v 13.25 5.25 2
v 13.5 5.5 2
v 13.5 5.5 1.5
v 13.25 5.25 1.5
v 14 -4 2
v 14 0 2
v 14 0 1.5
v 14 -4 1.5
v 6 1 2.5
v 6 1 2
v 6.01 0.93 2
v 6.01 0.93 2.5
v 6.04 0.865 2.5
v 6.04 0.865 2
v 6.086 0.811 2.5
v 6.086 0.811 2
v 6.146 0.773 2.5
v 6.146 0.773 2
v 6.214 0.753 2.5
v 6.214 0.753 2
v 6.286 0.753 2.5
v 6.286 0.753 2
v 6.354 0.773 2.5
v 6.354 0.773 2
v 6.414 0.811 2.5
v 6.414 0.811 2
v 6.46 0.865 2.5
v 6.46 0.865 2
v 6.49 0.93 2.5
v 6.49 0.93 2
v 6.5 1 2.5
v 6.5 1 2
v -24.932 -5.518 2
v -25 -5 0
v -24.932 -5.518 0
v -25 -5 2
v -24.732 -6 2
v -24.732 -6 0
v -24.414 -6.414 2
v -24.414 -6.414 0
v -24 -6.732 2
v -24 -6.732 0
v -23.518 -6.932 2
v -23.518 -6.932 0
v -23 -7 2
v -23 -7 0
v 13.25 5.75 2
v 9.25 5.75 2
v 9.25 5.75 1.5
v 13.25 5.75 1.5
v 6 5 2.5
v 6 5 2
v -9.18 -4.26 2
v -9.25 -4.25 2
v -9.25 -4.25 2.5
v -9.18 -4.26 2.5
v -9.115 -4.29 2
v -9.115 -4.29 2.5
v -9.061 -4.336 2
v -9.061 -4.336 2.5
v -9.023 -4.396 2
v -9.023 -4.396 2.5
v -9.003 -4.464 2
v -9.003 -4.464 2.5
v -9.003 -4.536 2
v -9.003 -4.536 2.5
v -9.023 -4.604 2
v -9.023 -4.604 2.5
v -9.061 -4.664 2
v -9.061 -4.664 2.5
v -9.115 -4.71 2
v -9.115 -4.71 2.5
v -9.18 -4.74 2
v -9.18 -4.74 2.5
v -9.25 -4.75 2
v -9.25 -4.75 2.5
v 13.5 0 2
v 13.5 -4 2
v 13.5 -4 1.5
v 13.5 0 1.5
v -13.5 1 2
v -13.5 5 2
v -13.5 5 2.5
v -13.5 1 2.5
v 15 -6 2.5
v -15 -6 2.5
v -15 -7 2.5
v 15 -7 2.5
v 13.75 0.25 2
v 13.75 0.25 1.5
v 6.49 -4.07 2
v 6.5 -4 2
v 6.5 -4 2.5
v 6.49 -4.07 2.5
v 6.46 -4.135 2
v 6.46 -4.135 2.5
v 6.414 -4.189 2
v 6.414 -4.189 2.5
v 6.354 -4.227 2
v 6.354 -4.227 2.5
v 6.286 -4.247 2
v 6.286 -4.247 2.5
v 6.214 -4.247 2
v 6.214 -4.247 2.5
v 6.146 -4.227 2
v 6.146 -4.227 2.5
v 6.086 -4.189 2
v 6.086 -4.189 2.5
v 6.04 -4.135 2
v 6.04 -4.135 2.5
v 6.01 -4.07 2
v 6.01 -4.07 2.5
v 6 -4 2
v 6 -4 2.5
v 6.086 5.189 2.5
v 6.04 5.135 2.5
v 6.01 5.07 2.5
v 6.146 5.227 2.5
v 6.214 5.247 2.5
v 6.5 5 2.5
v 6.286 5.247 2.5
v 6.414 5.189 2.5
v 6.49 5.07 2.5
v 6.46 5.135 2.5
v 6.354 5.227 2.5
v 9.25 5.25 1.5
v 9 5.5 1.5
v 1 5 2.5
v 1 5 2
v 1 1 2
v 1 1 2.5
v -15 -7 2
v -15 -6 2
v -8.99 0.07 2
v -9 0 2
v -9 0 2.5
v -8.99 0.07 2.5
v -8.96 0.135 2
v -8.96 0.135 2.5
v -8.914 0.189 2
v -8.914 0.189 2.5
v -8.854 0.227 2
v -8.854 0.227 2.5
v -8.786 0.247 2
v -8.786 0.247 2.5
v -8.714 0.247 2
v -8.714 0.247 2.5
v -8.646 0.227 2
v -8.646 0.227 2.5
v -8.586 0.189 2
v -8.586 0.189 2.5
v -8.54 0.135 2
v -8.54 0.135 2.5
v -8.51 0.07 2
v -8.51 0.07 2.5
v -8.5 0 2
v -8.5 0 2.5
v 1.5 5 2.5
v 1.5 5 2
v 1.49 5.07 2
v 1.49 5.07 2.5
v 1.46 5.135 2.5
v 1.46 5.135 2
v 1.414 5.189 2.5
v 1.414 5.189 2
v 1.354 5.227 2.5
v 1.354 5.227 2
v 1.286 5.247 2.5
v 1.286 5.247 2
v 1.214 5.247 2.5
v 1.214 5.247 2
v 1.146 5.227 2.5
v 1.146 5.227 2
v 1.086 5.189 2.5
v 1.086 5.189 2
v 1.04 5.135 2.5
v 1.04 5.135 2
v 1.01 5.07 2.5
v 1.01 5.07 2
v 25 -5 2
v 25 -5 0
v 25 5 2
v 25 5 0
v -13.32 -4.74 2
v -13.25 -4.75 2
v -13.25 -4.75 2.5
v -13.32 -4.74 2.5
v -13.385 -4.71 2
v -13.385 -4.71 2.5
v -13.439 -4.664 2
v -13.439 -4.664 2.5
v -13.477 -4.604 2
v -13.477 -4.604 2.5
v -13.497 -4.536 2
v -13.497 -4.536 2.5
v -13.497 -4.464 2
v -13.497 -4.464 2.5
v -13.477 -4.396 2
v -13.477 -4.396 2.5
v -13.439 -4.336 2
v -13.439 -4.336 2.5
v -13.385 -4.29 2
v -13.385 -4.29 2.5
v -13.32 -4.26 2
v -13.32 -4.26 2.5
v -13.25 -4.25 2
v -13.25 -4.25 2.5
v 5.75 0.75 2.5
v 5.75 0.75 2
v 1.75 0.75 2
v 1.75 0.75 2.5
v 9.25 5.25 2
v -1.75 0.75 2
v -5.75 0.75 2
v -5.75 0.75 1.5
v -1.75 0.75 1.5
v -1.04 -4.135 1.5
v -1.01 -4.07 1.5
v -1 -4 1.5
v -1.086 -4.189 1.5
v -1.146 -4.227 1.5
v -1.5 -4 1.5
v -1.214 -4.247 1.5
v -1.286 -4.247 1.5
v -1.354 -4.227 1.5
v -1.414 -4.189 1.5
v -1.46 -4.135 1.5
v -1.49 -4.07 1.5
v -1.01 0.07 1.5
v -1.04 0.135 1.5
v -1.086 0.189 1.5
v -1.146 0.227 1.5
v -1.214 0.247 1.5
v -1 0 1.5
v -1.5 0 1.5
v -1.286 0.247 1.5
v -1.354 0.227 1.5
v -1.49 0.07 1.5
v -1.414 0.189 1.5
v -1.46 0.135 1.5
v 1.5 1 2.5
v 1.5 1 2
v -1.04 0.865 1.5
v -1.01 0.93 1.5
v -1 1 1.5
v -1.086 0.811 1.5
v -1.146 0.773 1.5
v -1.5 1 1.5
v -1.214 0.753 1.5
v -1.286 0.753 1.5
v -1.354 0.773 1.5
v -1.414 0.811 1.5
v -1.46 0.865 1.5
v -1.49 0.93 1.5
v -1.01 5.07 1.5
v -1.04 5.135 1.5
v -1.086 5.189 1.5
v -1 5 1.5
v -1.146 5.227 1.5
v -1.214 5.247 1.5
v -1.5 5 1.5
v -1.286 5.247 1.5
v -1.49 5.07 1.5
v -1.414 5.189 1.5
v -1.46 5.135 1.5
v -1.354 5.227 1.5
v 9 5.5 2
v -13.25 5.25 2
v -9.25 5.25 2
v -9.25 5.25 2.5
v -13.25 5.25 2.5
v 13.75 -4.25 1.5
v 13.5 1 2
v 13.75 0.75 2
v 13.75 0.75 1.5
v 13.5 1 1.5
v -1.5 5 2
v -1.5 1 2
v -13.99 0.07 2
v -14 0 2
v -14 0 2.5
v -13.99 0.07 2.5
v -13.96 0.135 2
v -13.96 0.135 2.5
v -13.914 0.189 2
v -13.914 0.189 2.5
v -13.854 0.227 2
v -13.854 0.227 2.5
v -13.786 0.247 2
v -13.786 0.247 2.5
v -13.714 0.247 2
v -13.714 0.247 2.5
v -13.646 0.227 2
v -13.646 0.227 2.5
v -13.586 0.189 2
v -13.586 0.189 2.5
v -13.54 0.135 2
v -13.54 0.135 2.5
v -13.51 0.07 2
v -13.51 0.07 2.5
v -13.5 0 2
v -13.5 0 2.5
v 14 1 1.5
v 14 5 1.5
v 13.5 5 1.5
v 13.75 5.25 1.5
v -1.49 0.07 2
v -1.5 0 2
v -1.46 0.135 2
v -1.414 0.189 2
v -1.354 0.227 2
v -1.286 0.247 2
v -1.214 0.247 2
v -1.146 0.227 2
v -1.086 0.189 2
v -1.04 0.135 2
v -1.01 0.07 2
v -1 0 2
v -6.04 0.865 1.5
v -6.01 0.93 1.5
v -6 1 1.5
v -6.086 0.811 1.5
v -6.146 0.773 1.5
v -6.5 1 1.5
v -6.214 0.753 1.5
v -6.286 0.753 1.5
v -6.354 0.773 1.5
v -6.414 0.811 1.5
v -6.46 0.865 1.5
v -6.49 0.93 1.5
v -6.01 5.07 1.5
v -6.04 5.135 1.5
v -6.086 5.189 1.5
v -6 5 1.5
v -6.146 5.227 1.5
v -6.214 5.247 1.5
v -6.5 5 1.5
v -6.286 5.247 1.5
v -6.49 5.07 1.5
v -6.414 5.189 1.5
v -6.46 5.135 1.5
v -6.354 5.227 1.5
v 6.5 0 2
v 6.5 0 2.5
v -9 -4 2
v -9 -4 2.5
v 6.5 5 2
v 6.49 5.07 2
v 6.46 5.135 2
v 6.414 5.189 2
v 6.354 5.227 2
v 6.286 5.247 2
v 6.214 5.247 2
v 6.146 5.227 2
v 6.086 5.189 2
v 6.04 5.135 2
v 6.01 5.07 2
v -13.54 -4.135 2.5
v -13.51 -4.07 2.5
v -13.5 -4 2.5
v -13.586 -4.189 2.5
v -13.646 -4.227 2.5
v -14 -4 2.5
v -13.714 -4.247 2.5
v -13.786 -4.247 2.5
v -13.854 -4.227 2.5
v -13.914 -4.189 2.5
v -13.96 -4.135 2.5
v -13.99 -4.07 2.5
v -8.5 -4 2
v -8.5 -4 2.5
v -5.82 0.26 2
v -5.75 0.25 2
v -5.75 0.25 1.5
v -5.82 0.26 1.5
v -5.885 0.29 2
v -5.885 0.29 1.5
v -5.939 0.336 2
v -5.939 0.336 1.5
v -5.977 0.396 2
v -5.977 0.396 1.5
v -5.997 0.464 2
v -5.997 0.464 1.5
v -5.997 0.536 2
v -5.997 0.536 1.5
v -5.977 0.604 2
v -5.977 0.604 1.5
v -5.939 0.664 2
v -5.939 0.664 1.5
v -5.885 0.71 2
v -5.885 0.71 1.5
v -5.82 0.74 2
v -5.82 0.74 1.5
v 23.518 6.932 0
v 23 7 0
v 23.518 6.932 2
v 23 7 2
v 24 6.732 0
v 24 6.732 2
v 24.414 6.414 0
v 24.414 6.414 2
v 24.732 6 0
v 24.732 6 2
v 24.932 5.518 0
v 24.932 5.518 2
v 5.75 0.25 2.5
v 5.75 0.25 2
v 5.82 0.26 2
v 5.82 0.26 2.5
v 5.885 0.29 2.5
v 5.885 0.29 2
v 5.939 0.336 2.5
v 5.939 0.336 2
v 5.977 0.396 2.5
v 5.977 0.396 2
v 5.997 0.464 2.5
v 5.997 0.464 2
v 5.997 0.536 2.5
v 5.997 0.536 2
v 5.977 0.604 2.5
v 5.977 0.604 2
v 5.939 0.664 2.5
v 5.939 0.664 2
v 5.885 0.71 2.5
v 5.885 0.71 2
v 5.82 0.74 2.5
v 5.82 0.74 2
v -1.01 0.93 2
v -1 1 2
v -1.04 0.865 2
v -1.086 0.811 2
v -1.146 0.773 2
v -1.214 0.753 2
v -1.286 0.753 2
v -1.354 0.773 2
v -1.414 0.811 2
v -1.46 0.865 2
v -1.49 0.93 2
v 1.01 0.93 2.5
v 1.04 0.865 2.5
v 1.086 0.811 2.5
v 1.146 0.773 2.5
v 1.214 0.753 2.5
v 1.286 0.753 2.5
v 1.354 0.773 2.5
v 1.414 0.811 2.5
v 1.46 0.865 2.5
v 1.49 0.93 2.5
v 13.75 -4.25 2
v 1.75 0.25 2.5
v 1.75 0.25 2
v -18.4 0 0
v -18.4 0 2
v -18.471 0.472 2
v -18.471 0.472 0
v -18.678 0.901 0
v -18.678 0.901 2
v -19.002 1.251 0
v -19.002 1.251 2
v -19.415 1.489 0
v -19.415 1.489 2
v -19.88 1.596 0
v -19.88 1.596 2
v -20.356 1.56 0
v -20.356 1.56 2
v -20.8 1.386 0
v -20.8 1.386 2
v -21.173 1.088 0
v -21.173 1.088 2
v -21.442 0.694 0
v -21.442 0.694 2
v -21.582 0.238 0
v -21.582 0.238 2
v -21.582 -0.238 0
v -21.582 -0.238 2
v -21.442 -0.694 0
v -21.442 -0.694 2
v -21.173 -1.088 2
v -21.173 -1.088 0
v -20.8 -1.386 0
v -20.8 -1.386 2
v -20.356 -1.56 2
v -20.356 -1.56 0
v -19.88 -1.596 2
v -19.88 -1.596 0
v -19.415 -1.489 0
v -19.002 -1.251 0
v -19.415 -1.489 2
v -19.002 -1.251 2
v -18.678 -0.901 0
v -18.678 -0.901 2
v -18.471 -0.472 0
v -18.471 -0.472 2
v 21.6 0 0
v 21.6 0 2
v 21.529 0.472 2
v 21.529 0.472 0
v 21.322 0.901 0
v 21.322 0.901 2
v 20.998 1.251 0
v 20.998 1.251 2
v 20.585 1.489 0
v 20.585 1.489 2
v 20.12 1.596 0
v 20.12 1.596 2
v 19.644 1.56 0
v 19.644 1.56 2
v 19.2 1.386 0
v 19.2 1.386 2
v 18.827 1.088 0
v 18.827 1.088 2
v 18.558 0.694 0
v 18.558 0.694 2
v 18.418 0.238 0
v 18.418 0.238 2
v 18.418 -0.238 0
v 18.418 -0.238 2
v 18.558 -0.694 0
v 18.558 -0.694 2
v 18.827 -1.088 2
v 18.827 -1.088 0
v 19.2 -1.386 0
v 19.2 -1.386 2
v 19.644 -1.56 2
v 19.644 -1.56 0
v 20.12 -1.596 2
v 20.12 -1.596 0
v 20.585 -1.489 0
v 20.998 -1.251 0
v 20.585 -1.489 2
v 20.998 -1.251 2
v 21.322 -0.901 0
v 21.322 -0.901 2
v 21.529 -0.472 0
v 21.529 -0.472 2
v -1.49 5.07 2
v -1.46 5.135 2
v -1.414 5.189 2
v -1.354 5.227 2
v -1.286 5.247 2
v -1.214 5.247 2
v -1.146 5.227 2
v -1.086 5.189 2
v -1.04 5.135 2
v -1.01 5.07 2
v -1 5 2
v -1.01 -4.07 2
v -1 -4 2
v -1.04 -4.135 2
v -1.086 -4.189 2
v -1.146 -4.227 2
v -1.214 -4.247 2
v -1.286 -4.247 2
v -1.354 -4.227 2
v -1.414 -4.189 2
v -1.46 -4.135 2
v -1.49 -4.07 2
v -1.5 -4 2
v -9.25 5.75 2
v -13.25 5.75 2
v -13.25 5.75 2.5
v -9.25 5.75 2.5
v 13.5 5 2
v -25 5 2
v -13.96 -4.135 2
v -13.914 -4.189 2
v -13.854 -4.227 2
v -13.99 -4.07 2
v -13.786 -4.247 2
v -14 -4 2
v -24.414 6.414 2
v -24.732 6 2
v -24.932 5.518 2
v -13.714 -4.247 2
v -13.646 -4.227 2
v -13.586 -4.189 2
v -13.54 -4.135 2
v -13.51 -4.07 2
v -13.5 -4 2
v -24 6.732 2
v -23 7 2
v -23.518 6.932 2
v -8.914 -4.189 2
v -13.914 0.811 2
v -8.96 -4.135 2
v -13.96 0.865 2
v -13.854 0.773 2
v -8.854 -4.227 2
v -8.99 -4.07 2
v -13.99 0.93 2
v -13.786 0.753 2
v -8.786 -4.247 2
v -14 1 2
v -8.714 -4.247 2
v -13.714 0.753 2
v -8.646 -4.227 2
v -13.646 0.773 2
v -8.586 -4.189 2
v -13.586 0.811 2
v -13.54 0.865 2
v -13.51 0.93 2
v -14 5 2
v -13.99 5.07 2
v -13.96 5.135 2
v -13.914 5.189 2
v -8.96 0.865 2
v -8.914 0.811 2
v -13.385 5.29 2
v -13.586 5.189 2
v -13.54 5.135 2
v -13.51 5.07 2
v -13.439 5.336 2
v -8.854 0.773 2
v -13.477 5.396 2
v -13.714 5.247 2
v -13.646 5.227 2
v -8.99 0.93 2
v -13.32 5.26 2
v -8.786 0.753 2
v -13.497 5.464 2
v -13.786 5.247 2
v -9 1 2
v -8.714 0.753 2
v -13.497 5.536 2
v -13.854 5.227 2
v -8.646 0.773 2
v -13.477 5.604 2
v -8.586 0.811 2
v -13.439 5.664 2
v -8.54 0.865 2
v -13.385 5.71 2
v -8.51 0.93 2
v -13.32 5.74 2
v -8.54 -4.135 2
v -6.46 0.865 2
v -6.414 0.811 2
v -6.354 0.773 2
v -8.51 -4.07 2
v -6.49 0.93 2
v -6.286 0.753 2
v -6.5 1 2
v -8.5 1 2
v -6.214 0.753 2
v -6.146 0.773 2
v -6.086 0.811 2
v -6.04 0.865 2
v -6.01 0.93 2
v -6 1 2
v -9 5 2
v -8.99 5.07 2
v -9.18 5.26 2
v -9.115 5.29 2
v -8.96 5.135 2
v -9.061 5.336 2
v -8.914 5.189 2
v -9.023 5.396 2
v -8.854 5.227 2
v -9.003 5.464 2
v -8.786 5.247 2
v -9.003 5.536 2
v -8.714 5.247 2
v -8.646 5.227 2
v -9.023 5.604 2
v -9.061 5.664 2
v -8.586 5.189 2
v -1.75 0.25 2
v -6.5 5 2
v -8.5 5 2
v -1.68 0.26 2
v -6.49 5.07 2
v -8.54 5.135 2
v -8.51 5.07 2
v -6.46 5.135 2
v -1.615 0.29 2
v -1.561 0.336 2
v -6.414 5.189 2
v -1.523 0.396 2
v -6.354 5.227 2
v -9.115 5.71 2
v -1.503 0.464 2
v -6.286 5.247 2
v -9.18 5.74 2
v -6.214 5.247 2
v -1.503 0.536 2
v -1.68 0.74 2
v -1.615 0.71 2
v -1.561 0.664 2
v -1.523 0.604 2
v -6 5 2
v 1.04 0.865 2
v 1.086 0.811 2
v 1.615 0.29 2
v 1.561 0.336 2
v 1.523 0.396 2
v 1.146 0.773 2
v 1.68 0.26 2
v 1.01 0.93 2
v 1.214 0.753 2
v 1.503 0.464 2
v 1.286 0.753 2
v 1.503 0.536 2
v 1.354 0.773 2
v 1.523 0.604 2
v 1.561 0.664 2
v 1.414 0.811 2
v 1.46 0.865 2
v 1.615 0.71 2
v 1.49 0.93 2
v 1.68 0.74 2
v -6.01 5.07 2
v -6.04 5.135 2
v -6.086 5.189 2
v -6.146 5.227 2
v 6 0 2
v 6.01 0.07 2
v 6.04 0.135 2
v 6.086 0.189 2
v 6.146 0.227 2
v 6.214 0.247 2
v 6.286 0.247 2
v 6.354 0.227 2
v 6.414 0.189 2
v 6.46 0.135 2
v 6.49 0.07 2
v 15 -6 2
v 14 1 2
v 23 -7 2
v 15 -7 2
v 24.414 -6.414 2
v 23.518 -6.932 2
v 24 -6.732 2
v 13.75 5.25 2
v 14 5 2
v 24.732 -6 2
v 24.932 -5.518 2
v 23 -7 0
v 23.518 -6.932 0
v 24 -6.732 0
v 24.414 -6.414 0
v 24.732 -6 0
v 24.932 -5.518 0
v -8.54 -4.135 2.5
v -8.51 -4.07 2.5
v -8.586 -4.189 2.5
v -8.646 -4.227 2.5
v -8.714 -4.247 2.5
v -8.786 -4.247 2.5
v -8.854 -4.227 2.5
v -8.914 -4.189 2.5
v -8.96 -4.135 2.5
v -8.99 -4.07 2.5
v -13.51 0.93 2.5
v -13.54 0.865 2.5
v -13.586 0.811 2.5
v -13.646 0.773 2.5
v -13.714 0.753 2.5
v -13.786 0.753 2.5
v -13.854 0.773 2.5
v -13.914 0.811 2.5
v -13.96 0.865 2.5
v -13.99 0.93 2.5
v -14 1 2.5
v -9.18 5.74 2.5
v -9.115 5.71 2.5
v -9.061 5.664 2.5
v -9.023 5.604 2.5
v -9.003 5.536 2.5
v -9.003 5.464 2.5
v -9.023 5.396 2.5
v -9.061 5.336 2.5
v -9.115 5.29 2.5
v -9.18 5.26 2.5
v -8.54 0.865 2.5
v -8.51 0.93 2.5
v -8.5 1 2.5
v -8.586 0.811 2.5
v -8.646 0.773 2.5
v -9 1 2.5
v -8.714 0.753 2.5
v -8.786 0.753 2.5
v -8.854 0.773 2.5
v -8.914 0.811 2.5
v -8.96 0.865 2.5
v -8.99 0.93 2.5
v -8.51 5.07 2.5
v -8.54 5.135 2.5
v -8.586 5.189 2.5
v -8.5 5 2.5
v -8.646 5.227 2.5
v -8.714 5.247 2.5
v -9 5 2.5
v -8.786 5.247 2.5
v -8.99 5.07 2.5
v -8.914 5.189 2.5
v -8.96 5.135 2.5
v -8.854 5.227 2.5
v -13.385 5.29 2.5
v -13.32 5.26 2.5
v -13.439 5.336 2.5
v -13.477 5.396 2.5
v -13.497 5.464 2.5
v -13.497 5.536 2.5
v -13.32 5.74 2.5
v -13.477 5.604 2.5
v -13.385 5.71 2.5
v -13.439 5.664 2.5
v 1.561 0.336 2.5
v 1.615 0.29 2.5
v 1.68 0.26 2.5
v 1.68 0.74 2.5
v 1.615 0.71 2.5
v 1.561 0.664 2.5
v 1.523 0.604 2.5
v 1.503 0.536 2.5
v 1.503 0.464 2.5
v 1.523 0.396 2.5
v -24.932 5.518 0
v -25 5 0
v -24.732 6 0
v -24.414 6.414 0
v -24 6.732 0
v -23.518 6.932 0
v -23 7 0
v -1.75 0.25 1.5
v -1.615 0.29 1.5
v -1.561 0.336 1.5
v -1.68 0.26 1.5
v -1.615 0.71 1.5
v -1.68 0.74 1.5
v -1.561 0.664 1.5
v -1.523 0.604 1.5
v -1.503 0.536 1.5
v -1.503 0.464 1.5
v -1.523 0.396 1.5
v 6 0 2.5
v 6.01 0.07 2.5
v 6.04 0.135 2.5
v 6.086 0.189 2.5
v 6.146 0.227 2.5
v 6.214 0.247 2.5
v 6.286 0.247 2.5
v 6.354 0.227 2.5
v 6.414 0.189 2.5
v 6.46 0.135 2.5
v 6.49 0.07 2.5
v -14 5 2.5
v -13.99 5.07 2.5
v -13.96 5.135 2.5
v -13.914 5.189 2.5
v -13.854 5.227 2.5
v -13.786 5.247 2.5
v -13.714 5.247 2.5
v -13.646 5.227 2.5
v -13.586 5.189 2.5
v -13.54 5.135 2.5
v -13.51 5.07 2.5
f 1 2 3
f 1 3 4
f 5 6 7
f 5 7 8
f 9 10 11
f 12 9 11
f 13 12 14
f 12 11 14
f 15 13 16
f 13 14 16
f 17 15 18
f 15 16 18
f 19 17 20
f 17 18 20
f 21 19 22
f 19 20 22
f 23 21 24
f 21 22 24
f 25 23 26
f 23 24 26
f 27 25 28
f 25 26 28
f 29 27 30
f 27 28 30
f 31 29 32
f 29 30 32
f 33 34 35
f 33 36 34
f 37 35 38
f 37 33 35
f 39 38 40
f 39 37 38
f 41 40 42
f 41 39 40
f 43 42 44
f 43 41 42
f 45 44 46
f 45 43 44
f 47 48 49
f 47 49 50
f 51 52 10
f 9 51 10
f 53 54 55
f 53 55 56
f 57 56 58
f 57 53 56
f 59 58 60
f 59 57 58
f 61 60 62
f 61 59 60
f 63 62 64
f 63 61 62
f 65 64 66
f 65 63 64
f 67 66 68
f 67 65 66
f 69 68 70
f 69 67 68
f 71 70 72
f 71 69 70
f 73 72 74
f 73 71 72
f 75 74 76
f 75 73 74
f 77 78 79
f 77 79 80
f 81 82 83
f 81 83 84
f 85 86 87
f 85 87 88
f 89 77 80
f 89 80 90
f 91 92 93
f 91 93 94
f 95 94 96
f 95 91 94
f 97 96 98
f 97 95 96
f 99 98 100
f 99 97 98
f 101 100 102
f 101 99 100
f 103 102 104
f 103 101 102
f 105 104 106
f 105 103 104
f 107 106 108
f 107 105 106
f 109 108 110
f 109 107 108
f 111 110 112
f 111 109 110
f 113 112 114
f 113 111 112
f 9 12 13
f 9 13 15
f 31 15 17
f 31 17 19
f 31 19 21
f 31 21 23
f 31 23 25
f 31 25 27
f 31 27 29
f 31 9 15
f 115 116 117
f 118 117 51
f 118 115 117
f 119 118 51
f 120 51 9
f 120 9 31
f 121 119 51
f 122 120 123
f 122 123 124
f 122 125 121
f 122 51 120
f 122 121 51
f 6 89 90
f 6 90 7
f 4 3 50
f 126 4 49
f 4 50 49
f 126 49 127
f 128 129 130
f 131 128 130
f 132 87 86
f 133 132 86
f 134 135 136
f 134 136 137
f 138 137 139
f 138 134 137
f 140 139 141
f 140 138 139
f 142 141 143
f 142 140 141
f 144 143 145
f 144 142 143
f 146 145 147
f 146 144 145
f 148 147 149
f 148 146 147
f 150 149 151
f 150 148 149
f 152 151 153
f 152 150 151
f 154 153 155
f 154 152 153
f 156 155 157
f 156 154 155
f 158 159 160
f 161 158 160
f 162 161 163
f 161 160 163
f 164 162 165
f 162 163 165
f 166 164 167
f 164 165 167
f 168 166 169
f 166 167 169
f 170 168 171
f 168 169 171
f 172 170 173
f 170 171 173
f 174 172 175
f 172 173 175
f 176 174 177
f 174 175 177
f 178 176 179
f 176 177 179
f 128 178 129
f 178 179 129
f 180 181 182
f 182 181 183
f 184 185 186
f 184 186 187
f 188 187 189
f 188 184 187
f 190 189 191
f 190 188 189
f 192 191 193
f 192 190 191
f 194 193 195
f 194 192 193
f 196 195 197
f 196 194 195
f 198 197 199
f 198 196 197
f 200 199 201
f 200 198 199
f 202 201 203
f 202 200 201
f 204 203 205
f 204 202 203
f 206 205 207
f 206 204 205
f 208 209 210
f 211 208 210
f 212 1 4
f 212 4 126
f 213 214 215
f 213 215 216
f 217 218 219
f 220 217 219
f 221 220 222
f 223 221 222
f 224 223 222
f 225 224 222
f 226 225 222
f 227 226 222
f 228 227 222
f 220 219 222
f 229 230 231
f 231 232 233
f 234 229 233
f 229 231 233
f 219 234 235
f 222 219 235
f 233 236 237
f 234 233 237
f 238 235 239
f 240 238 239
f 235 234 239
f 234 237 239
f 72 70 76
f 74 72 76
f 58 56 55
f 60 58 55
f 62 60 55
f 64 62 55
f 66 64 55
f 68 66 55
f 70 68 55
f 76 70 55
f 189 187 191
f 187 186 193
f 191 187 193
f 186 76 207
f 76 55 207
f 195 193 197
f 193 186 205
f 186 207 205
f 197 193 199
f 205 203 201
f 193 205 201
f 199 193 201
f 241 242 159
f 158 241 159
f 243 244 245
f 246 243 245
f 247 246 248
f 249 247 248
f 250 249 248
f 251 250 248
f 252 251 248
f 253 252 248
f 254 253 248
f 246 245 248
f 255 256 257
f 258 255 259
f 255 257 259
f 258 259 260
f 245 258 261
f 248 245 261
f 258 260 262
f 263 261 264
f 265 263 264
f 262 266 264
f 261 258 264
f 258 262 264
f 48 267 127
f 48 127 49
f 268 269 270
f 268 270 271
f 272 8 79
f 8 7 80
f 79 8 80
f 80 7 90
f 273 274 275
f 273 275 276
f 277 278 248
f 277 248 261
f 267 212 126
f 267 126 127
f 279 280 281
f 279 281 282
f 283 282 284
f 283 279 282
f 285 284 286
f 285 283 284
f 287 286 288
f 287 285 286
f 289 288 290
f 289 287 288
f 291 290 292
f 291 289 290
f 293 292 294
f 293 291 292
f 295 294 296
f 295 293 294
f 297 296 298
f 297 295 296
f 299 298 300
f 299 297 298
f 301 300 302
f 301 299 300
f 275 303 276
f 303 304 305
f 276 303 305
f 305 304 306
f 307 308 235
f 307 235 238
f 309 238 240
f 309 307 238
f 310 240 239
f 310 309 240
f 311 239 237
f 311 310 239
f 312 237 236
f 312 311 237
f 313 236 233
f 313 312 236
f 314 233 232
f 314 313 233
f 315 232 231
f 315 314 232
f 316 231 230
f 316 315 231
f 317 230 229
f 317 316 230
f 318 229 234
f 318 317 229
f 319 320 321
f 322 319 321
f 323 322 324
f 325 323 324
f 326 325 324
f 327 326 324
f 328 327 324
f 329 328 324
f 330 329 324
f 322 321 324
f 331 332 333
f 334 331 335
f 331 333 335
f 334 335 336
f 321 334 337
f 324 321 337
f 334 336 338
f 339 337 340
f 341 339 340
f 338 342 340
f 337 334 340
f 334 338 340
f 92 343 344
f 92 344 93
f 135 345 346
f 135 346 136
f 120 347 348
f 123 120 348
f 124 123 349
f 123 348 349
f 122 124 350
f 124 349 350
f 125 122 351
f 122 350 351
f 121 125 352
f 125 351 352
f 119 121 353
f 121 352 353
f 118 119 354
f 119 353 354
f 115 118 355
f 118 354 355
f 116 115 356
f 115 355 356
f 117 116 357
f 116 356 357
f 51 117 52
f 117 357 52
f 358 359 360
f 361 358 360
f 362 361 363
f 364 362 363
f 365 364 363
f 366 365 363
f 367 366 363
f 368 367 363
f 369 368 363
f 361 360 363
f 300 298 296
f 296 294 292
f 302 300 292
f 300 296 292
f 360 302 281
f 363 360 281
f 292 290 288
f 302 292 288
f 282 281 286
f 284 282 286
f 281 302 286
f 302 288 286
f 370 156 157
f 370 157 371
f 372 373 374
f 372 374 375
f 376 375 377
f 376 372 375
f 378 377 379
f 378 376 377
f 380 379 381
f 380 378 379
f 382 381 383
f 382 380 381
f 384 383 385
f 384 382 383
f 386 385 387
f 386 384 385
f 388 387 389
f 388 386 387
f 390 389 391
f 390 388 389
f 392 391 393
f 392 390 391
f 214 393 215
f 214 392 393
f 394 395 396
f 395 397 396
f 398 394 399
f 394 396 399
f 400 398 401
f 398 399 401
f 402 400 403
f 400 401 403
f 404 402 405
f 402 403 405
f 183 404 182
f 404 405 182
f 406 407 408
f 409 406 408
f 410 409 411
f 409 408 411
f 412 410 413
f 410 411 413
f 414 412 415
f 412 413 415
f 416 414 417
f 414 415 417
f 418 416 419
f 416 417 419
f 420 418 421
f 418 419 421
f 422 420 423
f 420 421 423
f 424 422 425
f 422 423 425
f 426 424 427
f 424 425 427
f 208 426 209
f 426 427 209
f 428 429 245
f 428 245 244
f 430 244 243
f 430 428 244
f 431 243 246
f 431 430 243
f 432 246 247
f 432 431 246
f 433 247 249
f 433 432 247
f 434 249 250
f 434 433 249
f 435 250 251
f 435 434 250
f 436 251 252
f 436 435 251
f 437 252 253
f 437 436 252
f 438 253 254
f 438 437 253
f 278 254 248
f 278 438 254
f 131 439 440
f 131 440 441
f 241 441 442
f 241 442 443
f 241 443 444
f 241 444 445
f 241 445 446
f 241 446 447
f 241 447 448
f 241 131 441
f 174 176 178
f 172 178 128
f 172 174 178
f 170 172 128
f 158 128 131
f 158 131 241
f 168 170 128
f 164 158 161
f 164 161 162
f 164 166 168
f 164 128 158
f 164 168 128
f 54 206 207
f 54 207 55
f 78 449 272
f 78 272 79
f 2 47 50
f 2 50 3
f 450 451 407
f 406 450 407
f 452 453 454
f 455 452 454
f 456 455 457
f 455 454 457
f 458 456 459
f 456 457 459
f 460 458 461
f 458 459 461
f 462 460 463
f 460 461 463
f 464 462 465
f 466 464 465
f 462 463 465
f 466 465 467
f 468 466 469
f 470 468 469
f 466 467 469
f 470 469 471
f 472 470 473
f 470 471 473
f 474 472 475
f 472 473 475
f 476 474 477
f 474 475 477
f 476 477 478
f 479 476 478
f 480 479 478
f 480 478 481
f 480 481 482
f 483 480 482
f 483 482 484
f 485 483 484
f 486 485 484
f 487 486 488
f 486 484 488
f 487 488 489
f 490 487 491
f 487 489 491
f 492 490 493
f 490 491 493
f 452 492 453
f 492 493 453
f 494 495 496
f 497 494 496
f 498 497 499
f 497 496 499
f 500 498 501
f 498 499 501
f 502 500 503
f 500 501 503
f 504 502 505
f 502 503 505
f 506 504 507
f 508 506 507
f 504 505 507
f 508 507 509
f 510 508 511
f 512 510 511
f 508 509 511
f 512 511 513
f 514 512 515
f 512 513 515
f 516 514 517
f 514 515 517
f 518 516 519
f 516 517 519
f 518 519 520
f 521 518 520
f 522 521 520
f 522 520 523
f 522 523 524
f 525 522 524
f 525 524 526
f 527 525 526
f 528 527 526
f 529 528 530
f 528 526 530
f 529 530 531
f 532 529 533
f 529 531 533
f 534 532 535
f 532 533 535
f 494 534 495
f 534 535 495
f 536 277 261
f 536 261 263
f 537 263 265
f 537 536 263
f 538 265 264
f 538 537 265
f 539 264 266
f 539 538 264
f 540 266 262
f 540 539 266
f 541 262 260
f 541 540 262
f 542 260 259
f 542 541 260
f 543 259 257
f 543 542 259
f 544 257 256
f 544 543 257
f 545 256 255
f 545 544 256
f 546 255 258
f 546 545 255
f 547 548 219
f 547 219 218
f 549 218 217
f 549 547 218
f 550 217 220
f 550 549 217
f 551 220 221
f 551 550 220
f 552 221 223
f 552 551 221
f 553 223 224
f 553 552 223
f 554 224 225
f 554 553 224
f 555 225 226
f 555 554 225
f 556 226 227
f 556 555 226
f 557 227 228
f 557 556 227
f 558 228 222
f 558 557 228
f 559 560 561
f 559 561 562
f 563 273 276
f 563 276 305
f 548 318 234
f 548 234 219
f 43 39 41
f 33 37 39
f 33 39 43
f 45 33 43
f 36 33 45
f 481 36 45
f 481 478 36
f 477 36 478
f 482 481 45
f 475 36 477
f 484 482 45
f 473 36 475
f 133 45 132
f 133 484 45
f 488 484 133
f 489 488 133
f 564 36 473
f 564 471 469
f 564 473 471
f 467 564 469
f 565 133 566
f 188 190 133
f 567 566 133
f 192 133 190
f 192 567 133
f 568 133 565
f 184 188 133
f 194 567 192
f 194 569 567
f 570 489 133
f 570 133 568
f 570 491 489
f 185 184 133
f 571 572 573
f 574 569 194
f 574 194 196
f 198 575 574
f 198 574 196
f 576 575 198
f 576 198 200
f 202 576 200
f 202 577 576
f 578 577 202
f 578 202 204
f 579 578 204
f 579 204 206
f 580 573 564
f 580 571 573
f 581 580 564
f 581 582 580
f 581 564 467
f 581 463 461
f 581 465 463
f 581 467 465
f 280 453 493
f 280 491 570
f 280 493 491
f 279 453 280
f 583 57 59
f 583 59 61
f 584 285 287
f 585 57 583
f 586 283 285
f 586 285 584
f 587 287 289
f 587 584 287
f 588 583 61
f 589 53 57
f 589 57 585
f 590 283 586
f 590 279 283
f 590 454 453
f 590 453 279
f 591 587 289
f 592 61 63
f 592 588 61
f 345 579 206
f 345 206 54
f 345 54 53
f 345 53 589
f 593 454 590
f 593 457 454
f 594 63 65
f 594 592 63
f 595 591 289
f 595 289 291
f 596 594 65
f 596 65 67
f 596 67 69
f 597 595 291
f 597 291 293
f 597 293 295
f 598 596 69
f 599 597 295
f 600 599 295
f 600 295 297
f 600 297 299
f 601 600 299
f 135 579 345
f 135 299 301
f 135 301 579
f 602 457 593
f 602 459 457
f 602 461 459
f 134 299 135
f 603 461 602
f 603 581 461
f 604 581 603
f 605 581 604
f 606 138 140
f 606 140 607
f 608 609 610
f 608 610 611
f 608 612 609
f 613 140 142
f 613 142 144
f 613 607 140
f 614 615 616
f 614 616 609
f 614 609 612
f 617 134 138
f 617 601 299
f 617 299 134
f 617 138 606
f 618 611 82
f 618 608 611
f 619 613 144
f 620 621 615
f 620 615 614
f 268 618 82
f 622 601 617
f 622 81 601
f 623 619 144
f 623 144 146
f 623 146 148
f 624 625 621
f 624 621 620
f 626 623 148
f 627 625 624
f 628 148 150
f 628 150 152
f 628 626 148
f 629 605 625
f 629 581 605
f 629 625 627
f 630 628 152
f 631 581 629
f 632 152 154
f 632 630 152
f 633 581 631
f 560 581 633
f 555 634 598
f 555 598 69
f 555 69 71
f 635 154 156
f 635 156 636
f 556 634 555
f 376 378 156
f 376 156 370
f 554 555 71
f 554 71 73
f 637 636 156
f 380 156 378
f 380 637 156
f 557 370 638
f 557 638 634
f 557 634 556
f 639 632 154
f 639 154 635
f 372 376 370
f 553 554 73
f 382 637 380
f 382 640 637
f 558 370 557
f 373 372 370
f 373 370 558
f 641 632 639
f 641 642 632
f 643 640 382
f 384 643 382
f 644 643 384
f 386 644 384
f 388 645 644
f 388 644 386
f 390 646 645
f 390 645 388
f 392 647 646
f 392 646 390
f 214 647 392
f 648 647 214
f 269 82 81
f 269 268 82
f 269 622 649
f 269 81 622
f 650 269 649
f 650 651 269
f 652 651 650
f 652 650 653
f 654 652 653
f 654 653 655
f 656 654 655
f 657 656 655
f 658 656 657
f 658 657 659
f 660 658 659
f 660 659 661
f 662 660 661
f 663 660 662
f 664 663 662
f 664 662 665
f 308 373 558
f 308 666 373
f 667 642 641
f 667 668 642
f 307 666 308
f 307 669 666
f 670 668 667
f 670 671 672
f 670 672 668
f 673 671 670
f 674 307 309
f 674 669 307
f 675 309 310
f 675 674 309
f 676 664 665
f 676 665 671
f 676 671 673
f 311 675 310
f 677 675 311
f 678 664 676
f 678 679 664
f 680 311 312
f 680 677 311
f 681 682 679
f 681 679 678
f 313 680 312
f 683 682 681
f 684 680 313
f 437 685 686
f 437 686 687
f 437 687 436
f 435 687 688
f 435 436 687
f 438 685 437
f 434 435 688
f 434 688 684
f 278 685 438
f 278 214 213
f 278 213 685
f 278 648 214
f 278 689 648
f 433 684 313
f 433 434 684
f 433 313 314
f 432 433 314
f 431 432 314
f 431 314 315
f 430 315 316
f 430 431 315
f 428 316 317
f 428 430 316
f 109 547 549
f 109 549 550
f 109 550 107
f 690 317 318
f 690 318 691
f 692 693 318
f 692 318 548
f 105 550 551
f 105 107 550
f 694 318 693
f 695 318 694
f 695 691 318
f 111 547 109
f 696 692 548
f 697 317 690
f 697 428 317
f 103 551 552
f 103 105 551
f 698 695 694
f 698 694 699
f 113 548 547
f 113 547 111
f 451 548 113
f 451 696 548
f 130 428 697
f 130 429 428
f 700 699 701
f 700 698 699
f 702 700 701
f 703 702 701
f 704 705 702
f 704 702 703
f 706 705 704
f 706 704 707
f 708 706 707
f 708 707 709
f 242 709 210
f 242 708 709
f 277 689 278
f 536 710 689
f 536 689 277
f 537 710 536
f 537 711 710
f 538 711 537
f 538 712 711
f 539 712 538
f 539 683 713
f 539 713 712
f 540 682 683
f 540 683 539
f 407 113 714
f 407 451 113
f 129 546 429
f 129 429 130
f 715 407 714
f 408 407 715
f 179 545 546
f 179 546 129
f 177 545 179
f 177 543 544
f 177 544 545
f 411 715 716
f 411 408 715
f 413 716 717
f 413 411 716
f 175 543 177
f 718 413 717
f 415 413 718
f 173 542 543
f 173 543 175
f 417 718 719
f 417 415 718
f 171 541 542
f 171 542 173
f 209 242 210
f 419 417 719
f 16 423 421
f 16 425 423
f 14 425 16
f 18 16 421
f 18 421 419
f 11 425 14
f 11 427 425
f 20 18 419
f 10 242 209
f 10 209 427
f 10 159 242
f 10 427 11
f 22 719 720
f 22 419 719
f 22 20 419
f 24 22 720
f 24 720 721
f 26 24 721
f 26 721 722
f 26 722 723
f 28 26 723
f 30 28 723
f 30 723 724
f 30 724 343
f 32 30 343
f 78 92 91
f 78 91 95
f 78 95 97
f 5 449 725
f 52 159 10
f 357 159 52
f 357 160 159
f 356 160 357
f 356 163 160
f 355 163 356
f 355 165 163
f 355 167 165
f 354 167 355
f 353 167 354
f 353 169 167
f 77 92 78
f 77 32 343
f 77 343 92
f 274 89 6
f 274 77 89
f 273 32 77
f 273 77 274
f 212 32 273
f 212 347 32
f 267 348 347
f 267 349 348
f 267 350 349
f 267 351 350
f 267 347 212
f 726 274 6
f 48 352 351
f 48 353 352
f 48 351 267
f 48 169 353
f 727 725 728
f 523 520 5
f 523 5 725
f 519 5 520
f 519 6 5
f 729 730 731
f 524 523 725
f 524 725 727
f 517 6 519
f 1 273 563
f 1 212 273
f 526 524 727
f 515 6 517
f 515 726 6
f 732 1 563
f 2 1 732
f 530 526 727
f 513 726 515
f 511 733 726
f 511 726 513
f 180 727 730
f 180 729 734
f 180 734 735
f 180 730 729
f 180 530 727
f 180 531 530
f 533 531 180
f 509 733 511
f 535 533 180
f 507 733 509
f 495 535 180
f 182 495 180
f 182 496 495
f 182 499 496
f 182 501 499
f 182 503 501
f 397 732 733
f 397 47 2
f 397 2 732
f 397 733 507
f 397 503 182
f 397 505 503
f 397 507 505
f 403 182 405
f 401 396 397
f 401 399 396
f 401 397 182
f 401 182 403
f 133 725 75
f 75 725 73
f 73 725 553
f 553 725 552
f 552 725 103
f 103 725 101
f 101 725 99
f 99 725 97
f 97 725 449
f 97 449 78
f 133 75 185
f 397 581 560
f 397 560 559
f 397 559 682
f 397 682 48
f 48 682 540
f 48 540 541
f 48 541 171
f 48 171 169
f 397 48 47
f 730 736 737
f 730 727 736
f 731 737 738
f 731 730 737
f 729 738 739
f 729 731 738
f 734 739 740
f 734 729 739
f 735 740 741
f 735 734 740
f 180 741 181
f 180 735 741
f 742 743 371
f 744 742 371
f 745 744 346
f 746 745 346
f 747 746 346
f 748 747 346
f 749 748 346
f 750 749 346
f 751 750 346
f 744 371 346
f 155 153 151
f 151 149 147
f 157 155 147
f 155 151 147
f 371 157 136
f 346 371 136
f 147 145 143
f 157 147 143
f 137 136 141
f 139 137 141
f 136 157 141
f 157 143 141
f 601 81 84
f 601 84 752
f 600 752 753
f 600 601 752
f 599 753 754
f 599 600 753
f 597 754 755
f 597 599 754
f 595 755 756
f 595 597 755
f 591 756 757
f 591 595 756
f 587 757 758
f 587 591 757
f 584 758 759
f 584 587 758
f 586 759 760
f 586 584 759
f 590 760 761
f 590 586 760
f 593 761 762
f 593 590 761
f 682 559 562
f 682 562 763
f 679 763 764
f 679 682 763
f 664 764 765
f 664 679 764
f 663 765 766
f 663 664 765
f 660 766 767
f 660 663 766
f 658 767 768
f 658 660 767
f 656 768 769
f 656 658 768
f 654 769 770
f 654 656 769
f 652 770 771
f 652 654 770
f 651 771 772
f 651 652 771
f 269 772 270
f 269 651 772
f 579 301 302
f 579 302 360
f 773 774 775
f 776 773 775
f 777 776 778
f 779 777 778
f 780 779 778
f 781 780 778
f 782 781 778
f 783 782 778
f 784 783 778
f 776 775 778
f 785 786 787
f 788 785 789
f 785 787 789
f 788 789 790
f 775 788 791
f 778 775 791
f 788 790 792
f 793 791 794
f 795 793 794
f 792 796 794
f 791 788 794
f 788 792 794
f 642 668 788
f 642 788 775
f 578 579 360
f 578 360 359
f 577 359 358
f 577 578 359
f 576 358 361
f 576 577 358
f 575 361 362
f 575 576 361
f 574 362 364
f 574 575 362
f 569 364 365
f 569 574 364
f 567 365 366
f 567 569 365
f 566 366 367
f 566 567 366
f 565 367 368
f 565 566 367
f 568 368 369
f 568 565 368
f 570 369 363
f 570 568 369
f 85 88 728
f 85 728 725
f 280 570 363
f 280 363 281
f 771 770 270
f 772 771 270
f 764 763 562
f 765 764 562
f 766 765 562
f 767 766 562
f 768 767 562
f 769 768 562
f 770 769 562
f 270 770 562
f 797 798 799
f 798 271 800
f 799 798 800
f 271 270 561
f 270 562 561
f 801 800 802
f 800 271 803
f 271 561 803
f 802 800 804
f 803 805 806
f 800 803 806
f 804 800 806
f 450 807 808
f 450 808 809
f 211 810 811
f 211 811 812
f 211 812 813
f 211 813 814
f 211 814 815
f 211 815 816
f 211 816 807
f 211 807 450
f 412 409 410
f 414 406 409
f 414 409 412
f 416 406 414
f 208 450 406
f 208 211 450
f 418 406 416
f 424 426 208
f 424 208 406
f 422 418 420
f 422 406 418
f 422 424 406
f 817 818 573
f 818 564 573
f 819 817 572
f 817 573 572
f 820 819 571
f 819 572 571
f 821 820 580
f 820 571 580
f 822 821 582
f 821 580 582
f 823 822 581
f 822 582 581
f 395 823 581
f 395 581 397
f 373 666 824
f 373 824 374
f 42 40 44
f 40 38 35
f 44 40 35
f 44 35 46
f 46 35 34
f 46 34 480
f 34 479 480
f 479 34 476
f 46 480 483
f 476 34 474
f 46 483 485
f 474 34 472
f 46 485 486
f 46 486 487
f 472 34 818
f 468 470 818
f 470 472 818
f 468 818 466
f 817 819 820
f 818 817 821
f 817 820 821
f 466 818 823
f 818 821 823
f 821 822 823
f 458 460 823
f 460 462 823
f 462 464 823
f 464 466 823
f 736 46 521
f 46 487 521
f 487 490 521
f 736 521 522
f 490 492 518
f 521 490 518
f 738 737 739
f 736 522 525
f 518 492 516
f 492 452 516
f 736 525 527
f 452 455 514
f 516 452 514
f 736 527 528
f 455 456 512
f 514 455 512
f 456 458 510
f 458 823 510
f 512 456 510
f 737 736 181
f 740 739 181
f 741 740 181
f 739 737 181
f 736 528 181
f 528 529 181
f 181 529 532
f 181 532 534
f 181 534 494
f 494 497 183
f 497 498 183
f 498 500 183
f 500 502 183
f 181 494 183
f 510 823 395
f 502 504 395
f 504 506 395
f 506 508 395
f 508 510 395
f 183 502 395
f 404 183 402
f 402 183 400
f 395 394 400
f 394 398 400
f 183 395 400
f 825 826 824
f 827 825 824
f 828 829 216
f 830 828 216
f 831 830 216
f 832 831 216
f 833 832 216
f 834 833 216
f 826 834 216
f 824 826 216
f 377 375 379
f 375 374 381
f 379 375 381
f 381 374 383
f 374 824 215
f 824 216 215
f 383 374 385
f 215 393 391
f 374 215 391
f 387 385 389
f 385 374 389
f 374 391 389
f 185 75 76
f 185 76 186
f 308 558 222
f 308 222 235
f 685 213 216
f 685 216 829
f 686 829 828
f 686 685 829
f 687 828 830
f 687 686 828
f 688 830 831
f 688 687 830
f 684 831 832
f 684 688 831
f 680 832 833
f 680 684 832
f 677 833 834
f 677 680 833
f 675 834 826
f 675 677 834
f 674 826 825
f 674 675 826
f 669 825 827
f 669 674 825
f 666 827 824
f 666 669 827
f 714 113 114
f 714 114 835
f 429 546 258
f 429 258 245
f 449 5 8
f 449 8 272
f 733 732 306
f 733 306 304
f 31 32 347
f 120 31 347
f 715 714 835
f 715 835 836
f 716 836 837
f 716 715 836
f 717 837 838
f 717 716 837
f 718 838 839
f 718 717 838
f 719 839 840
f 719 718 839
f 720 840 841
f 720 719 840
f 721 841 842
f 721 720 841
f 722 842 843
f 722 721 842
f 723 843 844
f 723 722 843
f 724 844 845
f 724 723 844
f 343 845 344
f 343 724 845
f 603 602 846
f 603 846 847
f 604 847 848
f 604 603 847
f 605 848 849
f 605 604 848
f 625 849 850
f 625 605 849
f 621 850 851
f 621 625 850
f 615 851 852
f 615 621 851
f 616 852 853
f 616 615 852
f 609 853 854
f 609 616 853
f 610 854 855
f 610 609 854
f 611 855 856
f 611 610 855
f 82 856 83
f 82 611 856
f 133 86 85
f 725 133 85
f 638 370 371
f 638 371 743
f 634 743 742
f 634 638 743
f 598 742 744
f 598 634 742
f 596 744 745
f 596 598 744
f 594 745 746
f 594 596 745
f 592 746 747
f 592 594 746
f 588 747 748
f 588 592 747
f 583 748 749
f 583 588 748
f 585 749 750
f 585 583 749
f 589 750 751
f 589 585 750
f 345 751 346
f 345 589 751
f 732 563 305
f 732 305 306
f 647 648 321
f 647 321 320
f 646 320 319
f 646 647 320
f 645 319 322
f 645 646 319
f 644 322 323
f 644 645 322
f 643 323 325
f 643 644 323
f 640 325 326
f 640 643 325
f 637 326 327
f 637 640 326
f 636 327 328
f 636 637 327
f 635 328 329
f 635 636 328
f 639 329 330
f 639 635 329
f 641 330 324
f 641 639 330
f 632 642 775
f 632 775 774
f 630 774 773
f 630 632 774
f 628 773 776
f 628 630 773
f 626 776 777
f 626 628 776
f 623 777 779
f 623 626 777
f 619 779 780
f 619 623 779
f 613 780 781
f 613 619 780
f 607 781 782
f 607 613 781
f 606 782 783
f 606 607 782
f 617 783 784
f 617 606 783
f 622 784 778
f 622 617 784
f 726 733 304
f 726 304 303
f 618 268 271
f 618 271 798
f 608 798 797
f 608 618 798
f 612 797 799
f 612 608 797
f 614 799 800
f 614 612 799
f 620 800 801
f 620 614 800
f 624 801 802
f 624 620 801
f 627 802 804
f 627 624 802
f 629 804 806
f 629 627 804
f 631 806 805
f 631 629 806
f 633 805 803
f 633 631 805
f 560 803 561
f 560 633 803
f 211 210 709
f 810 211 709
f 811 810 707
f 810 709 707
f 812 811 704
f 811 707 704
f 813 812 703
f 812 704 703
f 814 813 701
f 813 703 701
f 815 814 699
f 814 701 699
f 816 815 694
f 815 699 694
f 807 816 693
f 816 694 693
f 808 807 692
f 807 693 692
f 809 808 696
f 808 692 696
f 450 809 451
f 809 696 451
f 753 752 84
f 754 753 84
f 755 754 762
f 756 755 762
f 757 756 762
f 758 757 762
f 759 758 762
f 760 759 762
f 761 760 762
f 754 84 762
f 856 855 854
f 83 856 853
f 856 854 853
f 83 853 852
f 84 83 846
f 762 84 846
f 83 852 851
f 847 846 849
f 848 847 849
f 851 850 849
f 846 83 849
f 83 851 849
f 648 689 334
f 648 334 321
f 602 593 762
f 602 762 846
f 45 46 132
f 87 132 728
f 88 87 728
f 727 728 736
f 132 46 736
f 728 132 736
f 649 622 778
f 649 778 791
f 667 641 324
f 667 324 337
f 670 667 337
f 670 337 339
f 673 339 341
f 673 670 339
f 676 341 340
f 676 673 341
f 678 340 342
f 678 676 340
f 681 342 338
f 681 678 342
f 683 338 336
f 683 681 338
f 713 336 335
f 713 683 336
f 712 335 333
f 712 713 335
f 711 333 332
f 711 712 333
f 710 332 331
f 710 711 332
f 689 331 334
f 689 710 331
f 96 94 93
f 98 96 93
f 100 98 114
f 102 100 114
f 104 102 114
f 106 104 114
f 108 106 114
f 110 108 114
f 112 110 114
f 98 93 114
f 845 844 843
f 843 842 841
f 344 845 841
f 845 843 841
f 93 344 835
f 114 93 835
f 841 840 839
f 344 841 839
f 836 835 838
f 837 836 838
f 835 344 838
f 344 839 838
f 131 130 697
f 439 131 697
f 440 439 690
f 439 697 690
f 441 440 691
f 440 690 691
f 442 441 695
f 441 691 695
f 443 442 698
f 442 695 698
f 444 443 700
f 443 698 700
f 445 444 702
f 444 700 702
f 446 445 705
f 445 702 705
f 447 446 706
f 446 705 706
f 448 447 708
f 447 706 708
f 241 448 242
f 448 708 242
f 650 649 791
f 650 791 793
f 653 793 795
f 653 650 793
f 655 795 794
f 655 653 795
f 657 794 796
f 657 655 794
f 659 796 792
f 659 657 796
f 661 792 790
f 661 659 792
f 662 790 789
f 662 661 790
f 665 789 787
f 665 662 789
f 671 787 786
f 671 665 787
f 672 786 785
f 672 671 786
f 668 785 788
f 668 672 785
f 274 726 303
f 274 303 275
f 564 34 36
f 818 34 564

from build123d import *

# Parameters (mm, degrees)
SKETCH2_W           = 50
SKETCH2_H           = 14
BOSS_EXTRUDE1_DEPTH = 2.5
SKETCH4_OUTSIDE_W   = 62.396
SKETCH4_OUTSIDE_H   = 26.396
SKETCH4_OUTSIDE_W_2 = 30
SKETCH4_OUTSIDE_H_2 = 1
CUT_EXTRUDE1_DEPTH  = 0.5
SKETCH5_R           = 1.6
CUT_EXTRUDE2_DEPTH  = 2
FILLET2_R           = 2
CUT_EXTRUDE7_DEPTH  = 0.5
BOSS_EXTRUDE4_DEPTH = 0.5


with BuildPart() as part:
    # Sketch2 → Boss-Extrude1 (new body)
    with BuildSketch(Plane.XY):
        Rectangle(SKETCH2_W, SKETCH2_H)
    extrude(amount=BOSS_EXTRUDE1_DEPTH)

    # Sketch4 outside → Cut-Extrude1 (cut)
    with BuildSketch(Plane.XY.offset(2.5)):
        Rectangle(SKETCH4_OUTSIDE_W, SKETCH4_OUTSIDE_H)
        with Locations((0, -6.5)):
            Rectangle(SKETCH4_OUTSIDE_W_2, SKETCH4_OUTSIDE_H_2, mode=Mode.SUBTRACT)
    extrude(amount=-CUT_EXTRUDE1_DEPTH, mode=Mode.SUBTRACT)

    # Sketch5 → Cut-Extrude2 (cut)
    with BuildSketch(Plane.XY.offset(2)):
        with Locations((-20, 0)):
            Circle(SKETCH5_R)
        with Locations((20, 0)):
            Circle(SKETCH5_R)
    extrude(amount=-CUT_EXTRUDE2_DEPTH, mode=Mode.SUBTRACT)

    # Fillet2
    fillet2_edges = [part.edges().sort_by_distance(p)[0] for p in [
        (25, -7, 1),
        (-25, -7, 1),
        (-25, 7, 1),
        (25, 7, 1),
    ]]
    fillet(fillet2_edges, radius=FILLET2_R)

    # Sketch6 → Cut-Extrude7 (cut)
    with BuildSketch(Plane.XY.offset(2)):
        with BuildLine():
            Line((-5.75, 0.75), (-1.75, 0.75))
            ThreePointArc((-1.75, 0.75), (-1.5, 0.5), (-1.75, 0.25))
            Line((-1.75, 0.25), (-5.75, 0.25))
            ThreePointArc((-5.75, 0.25), (-6, 0.5), (-5.75, 0.75))
        make_face()
        with BuildLine():
            Line((-6.5, 1), (-6.5, 5))
            ThreePointArc((-6.5, 5), (-6.25, 5.25), (-6, 5))
            Line((-6, 5), (-6, 1))
            ThreePointArc((-6, 1), (-6.25, 0.75), (-6.5, 1))
        make_face()
        with BuildLine():
            Line((-1, 0), (-1, -4))
            ThreePointArc((-1, -4), (-1.25, -4.25), (-1.5, -4))
            Line((-1.5, -4), (-1.5, 0))
            ThreePointArc((-1.5, 0), (-1.25, 0.25), (-1, 0))
        make_face()
        with BuildLine():
            Line((-1.5, 1), (-1.5, 5))
            ThreePointArc((-1.5, 5), (-1.25, 5.25), (-1, 5))
            Line((-1, 5), (-1, 1))
            ThreePointArc((-1, 1), (-1.25, 0.75), (-1.5, 1))
        make_face()
        Polygon((14, 0), (14, -4), (13.75, -4.25), (13.5, -4), (13.5, 0), (13.75, 0.25), align=None)
        Polygon((13.25, 5.25), (9.25, 5.25), (9, 5.5), (9.25, 5.75), (13.25, 5.75), (13.5, 5.5), align=None)
        Polygon((13.5, 1), (13.5, 5), (13.75, 5.25), (14, 5), (14, 1), (13.75, 0.75), align=None)
    extrude(amount=-CUT_EXTRUDE7_DEPTH, mode=Mode.SUBTRACT)

    # Sketch6<10> → Boss-Extrude4 (add)
    with BuildSketch(Plane.XY.offset(2)):
        with BuildLine():
            Line((-9, 1), (-9, 5))
            ThreePointArc((-9, 5), (-8.75, 5.25), (-8.5, 5))
            Line((-8.5, 5), (-8.5, 1))
            ThreePointArc((-8.5, 1), (-8.75, 0.75), (-9, 1))
        make_face()
        with BuildLine():
            Line((-13.25, -4.25), (-9.25, -4.25))
            ThreePointArc((-9.25, -4.25), (-9, -4.5), (-9.25, -4.75))
            Line((-9.25, -4.75), (-13.25, -4.75))
            ThreePointArc((-13.25, -4.75), (-13.5, -4.5), (-13.25, -4.25))
        make_face()
        with BuildLine():
            Line((-13.25, 5.75), (-9.25, 5.75))
            ThreePointArc((-9.25, 5.75), (-9, 5.5), (-9.25, 5.25))
            Line((-9.25, 5.25), (-13.25, 5.25))
            ThreePointArc((-13.25, 5.25), (-13.5, 5.5), (-13.25, 5.75))
        make_face()
        with BuildLine():
            Line((-13.5, 0), (-13.5, -4))
            ThreePointArc((-13.5, -4), (-13.75, -4.25), (-14, -4))
            Line((-14, -4), (-14, 0))
            ThreePointArc((-14, 0), (-13.75, 0.25), (-13.5, 0))
        make_face()
        with BuildLine():
            Line((-14, 1), (-14, 5))
            ThreePointArc((-14, 5), (-13.75, 5.25), (-13.5, 5))
            Line((-13.5, 5), (-13.5, 1))
            ThreePointArc((-13.5, 1), (-13.75, 0.75), (-14, 1))
        make_face()
        with BuildLine():
            Line((-8.5, 0), (-8.5, -4))
            ThreePointArc((-8.5, -4), (-8.75, -4.25), (-9, -4))
            Line((-9, -4), (-9, 0))
            ThreePointArc((-9, 0), (-8.75, 0.25), (-8.5, 0))
        make_face()
        with BuildLine():
            Line((1.5, 1), (1.5, 5))
            ThreePointArc((1.5, 5), (1.25, 5.25), (1, 5))
            Line((1, 5), (1, 1))
            ThreePointArc((1, 1), (1.25, 0.75), (1.5, 1))
        make_face()
        with BuildLine():
            Line((1.75, 0.25), (5.75, 0.25))
            ThreePointArc((5.75, 0.25), (6, 0.5), (5.75, 0.75))
            Line((5.75, 0.75), (1.75, 0.75))
            ThreePointArc((1.75, 0.75), (1.5, 0.5), (1.75, 0.25))
        make_face()
        with BuildLine():
            Line((6.5, 1), (6.5, 5))
            ThreePointArc((6.5, 5), (6.25, 5.25), (6, 5))
            Line((6, 5), (6, 1))
            ThreePointArc((6, 1), (6.25, 0.75), (6.5, 1))
        make_face()
        with BuildLine():
            Line((6.5, 0), (6.5, -4))
            ThreePointArc((6.5, -4), (6.25, -4.25), (6, -4))
            Line((6, -4), (6, 0))
            ThreePointArc((6, 0), (6.25, 0.25), (6.5, 0))
        make_face()
    extrude(amount=BOSS_EXTRUDE4_DEPTH)


solid = part.part
